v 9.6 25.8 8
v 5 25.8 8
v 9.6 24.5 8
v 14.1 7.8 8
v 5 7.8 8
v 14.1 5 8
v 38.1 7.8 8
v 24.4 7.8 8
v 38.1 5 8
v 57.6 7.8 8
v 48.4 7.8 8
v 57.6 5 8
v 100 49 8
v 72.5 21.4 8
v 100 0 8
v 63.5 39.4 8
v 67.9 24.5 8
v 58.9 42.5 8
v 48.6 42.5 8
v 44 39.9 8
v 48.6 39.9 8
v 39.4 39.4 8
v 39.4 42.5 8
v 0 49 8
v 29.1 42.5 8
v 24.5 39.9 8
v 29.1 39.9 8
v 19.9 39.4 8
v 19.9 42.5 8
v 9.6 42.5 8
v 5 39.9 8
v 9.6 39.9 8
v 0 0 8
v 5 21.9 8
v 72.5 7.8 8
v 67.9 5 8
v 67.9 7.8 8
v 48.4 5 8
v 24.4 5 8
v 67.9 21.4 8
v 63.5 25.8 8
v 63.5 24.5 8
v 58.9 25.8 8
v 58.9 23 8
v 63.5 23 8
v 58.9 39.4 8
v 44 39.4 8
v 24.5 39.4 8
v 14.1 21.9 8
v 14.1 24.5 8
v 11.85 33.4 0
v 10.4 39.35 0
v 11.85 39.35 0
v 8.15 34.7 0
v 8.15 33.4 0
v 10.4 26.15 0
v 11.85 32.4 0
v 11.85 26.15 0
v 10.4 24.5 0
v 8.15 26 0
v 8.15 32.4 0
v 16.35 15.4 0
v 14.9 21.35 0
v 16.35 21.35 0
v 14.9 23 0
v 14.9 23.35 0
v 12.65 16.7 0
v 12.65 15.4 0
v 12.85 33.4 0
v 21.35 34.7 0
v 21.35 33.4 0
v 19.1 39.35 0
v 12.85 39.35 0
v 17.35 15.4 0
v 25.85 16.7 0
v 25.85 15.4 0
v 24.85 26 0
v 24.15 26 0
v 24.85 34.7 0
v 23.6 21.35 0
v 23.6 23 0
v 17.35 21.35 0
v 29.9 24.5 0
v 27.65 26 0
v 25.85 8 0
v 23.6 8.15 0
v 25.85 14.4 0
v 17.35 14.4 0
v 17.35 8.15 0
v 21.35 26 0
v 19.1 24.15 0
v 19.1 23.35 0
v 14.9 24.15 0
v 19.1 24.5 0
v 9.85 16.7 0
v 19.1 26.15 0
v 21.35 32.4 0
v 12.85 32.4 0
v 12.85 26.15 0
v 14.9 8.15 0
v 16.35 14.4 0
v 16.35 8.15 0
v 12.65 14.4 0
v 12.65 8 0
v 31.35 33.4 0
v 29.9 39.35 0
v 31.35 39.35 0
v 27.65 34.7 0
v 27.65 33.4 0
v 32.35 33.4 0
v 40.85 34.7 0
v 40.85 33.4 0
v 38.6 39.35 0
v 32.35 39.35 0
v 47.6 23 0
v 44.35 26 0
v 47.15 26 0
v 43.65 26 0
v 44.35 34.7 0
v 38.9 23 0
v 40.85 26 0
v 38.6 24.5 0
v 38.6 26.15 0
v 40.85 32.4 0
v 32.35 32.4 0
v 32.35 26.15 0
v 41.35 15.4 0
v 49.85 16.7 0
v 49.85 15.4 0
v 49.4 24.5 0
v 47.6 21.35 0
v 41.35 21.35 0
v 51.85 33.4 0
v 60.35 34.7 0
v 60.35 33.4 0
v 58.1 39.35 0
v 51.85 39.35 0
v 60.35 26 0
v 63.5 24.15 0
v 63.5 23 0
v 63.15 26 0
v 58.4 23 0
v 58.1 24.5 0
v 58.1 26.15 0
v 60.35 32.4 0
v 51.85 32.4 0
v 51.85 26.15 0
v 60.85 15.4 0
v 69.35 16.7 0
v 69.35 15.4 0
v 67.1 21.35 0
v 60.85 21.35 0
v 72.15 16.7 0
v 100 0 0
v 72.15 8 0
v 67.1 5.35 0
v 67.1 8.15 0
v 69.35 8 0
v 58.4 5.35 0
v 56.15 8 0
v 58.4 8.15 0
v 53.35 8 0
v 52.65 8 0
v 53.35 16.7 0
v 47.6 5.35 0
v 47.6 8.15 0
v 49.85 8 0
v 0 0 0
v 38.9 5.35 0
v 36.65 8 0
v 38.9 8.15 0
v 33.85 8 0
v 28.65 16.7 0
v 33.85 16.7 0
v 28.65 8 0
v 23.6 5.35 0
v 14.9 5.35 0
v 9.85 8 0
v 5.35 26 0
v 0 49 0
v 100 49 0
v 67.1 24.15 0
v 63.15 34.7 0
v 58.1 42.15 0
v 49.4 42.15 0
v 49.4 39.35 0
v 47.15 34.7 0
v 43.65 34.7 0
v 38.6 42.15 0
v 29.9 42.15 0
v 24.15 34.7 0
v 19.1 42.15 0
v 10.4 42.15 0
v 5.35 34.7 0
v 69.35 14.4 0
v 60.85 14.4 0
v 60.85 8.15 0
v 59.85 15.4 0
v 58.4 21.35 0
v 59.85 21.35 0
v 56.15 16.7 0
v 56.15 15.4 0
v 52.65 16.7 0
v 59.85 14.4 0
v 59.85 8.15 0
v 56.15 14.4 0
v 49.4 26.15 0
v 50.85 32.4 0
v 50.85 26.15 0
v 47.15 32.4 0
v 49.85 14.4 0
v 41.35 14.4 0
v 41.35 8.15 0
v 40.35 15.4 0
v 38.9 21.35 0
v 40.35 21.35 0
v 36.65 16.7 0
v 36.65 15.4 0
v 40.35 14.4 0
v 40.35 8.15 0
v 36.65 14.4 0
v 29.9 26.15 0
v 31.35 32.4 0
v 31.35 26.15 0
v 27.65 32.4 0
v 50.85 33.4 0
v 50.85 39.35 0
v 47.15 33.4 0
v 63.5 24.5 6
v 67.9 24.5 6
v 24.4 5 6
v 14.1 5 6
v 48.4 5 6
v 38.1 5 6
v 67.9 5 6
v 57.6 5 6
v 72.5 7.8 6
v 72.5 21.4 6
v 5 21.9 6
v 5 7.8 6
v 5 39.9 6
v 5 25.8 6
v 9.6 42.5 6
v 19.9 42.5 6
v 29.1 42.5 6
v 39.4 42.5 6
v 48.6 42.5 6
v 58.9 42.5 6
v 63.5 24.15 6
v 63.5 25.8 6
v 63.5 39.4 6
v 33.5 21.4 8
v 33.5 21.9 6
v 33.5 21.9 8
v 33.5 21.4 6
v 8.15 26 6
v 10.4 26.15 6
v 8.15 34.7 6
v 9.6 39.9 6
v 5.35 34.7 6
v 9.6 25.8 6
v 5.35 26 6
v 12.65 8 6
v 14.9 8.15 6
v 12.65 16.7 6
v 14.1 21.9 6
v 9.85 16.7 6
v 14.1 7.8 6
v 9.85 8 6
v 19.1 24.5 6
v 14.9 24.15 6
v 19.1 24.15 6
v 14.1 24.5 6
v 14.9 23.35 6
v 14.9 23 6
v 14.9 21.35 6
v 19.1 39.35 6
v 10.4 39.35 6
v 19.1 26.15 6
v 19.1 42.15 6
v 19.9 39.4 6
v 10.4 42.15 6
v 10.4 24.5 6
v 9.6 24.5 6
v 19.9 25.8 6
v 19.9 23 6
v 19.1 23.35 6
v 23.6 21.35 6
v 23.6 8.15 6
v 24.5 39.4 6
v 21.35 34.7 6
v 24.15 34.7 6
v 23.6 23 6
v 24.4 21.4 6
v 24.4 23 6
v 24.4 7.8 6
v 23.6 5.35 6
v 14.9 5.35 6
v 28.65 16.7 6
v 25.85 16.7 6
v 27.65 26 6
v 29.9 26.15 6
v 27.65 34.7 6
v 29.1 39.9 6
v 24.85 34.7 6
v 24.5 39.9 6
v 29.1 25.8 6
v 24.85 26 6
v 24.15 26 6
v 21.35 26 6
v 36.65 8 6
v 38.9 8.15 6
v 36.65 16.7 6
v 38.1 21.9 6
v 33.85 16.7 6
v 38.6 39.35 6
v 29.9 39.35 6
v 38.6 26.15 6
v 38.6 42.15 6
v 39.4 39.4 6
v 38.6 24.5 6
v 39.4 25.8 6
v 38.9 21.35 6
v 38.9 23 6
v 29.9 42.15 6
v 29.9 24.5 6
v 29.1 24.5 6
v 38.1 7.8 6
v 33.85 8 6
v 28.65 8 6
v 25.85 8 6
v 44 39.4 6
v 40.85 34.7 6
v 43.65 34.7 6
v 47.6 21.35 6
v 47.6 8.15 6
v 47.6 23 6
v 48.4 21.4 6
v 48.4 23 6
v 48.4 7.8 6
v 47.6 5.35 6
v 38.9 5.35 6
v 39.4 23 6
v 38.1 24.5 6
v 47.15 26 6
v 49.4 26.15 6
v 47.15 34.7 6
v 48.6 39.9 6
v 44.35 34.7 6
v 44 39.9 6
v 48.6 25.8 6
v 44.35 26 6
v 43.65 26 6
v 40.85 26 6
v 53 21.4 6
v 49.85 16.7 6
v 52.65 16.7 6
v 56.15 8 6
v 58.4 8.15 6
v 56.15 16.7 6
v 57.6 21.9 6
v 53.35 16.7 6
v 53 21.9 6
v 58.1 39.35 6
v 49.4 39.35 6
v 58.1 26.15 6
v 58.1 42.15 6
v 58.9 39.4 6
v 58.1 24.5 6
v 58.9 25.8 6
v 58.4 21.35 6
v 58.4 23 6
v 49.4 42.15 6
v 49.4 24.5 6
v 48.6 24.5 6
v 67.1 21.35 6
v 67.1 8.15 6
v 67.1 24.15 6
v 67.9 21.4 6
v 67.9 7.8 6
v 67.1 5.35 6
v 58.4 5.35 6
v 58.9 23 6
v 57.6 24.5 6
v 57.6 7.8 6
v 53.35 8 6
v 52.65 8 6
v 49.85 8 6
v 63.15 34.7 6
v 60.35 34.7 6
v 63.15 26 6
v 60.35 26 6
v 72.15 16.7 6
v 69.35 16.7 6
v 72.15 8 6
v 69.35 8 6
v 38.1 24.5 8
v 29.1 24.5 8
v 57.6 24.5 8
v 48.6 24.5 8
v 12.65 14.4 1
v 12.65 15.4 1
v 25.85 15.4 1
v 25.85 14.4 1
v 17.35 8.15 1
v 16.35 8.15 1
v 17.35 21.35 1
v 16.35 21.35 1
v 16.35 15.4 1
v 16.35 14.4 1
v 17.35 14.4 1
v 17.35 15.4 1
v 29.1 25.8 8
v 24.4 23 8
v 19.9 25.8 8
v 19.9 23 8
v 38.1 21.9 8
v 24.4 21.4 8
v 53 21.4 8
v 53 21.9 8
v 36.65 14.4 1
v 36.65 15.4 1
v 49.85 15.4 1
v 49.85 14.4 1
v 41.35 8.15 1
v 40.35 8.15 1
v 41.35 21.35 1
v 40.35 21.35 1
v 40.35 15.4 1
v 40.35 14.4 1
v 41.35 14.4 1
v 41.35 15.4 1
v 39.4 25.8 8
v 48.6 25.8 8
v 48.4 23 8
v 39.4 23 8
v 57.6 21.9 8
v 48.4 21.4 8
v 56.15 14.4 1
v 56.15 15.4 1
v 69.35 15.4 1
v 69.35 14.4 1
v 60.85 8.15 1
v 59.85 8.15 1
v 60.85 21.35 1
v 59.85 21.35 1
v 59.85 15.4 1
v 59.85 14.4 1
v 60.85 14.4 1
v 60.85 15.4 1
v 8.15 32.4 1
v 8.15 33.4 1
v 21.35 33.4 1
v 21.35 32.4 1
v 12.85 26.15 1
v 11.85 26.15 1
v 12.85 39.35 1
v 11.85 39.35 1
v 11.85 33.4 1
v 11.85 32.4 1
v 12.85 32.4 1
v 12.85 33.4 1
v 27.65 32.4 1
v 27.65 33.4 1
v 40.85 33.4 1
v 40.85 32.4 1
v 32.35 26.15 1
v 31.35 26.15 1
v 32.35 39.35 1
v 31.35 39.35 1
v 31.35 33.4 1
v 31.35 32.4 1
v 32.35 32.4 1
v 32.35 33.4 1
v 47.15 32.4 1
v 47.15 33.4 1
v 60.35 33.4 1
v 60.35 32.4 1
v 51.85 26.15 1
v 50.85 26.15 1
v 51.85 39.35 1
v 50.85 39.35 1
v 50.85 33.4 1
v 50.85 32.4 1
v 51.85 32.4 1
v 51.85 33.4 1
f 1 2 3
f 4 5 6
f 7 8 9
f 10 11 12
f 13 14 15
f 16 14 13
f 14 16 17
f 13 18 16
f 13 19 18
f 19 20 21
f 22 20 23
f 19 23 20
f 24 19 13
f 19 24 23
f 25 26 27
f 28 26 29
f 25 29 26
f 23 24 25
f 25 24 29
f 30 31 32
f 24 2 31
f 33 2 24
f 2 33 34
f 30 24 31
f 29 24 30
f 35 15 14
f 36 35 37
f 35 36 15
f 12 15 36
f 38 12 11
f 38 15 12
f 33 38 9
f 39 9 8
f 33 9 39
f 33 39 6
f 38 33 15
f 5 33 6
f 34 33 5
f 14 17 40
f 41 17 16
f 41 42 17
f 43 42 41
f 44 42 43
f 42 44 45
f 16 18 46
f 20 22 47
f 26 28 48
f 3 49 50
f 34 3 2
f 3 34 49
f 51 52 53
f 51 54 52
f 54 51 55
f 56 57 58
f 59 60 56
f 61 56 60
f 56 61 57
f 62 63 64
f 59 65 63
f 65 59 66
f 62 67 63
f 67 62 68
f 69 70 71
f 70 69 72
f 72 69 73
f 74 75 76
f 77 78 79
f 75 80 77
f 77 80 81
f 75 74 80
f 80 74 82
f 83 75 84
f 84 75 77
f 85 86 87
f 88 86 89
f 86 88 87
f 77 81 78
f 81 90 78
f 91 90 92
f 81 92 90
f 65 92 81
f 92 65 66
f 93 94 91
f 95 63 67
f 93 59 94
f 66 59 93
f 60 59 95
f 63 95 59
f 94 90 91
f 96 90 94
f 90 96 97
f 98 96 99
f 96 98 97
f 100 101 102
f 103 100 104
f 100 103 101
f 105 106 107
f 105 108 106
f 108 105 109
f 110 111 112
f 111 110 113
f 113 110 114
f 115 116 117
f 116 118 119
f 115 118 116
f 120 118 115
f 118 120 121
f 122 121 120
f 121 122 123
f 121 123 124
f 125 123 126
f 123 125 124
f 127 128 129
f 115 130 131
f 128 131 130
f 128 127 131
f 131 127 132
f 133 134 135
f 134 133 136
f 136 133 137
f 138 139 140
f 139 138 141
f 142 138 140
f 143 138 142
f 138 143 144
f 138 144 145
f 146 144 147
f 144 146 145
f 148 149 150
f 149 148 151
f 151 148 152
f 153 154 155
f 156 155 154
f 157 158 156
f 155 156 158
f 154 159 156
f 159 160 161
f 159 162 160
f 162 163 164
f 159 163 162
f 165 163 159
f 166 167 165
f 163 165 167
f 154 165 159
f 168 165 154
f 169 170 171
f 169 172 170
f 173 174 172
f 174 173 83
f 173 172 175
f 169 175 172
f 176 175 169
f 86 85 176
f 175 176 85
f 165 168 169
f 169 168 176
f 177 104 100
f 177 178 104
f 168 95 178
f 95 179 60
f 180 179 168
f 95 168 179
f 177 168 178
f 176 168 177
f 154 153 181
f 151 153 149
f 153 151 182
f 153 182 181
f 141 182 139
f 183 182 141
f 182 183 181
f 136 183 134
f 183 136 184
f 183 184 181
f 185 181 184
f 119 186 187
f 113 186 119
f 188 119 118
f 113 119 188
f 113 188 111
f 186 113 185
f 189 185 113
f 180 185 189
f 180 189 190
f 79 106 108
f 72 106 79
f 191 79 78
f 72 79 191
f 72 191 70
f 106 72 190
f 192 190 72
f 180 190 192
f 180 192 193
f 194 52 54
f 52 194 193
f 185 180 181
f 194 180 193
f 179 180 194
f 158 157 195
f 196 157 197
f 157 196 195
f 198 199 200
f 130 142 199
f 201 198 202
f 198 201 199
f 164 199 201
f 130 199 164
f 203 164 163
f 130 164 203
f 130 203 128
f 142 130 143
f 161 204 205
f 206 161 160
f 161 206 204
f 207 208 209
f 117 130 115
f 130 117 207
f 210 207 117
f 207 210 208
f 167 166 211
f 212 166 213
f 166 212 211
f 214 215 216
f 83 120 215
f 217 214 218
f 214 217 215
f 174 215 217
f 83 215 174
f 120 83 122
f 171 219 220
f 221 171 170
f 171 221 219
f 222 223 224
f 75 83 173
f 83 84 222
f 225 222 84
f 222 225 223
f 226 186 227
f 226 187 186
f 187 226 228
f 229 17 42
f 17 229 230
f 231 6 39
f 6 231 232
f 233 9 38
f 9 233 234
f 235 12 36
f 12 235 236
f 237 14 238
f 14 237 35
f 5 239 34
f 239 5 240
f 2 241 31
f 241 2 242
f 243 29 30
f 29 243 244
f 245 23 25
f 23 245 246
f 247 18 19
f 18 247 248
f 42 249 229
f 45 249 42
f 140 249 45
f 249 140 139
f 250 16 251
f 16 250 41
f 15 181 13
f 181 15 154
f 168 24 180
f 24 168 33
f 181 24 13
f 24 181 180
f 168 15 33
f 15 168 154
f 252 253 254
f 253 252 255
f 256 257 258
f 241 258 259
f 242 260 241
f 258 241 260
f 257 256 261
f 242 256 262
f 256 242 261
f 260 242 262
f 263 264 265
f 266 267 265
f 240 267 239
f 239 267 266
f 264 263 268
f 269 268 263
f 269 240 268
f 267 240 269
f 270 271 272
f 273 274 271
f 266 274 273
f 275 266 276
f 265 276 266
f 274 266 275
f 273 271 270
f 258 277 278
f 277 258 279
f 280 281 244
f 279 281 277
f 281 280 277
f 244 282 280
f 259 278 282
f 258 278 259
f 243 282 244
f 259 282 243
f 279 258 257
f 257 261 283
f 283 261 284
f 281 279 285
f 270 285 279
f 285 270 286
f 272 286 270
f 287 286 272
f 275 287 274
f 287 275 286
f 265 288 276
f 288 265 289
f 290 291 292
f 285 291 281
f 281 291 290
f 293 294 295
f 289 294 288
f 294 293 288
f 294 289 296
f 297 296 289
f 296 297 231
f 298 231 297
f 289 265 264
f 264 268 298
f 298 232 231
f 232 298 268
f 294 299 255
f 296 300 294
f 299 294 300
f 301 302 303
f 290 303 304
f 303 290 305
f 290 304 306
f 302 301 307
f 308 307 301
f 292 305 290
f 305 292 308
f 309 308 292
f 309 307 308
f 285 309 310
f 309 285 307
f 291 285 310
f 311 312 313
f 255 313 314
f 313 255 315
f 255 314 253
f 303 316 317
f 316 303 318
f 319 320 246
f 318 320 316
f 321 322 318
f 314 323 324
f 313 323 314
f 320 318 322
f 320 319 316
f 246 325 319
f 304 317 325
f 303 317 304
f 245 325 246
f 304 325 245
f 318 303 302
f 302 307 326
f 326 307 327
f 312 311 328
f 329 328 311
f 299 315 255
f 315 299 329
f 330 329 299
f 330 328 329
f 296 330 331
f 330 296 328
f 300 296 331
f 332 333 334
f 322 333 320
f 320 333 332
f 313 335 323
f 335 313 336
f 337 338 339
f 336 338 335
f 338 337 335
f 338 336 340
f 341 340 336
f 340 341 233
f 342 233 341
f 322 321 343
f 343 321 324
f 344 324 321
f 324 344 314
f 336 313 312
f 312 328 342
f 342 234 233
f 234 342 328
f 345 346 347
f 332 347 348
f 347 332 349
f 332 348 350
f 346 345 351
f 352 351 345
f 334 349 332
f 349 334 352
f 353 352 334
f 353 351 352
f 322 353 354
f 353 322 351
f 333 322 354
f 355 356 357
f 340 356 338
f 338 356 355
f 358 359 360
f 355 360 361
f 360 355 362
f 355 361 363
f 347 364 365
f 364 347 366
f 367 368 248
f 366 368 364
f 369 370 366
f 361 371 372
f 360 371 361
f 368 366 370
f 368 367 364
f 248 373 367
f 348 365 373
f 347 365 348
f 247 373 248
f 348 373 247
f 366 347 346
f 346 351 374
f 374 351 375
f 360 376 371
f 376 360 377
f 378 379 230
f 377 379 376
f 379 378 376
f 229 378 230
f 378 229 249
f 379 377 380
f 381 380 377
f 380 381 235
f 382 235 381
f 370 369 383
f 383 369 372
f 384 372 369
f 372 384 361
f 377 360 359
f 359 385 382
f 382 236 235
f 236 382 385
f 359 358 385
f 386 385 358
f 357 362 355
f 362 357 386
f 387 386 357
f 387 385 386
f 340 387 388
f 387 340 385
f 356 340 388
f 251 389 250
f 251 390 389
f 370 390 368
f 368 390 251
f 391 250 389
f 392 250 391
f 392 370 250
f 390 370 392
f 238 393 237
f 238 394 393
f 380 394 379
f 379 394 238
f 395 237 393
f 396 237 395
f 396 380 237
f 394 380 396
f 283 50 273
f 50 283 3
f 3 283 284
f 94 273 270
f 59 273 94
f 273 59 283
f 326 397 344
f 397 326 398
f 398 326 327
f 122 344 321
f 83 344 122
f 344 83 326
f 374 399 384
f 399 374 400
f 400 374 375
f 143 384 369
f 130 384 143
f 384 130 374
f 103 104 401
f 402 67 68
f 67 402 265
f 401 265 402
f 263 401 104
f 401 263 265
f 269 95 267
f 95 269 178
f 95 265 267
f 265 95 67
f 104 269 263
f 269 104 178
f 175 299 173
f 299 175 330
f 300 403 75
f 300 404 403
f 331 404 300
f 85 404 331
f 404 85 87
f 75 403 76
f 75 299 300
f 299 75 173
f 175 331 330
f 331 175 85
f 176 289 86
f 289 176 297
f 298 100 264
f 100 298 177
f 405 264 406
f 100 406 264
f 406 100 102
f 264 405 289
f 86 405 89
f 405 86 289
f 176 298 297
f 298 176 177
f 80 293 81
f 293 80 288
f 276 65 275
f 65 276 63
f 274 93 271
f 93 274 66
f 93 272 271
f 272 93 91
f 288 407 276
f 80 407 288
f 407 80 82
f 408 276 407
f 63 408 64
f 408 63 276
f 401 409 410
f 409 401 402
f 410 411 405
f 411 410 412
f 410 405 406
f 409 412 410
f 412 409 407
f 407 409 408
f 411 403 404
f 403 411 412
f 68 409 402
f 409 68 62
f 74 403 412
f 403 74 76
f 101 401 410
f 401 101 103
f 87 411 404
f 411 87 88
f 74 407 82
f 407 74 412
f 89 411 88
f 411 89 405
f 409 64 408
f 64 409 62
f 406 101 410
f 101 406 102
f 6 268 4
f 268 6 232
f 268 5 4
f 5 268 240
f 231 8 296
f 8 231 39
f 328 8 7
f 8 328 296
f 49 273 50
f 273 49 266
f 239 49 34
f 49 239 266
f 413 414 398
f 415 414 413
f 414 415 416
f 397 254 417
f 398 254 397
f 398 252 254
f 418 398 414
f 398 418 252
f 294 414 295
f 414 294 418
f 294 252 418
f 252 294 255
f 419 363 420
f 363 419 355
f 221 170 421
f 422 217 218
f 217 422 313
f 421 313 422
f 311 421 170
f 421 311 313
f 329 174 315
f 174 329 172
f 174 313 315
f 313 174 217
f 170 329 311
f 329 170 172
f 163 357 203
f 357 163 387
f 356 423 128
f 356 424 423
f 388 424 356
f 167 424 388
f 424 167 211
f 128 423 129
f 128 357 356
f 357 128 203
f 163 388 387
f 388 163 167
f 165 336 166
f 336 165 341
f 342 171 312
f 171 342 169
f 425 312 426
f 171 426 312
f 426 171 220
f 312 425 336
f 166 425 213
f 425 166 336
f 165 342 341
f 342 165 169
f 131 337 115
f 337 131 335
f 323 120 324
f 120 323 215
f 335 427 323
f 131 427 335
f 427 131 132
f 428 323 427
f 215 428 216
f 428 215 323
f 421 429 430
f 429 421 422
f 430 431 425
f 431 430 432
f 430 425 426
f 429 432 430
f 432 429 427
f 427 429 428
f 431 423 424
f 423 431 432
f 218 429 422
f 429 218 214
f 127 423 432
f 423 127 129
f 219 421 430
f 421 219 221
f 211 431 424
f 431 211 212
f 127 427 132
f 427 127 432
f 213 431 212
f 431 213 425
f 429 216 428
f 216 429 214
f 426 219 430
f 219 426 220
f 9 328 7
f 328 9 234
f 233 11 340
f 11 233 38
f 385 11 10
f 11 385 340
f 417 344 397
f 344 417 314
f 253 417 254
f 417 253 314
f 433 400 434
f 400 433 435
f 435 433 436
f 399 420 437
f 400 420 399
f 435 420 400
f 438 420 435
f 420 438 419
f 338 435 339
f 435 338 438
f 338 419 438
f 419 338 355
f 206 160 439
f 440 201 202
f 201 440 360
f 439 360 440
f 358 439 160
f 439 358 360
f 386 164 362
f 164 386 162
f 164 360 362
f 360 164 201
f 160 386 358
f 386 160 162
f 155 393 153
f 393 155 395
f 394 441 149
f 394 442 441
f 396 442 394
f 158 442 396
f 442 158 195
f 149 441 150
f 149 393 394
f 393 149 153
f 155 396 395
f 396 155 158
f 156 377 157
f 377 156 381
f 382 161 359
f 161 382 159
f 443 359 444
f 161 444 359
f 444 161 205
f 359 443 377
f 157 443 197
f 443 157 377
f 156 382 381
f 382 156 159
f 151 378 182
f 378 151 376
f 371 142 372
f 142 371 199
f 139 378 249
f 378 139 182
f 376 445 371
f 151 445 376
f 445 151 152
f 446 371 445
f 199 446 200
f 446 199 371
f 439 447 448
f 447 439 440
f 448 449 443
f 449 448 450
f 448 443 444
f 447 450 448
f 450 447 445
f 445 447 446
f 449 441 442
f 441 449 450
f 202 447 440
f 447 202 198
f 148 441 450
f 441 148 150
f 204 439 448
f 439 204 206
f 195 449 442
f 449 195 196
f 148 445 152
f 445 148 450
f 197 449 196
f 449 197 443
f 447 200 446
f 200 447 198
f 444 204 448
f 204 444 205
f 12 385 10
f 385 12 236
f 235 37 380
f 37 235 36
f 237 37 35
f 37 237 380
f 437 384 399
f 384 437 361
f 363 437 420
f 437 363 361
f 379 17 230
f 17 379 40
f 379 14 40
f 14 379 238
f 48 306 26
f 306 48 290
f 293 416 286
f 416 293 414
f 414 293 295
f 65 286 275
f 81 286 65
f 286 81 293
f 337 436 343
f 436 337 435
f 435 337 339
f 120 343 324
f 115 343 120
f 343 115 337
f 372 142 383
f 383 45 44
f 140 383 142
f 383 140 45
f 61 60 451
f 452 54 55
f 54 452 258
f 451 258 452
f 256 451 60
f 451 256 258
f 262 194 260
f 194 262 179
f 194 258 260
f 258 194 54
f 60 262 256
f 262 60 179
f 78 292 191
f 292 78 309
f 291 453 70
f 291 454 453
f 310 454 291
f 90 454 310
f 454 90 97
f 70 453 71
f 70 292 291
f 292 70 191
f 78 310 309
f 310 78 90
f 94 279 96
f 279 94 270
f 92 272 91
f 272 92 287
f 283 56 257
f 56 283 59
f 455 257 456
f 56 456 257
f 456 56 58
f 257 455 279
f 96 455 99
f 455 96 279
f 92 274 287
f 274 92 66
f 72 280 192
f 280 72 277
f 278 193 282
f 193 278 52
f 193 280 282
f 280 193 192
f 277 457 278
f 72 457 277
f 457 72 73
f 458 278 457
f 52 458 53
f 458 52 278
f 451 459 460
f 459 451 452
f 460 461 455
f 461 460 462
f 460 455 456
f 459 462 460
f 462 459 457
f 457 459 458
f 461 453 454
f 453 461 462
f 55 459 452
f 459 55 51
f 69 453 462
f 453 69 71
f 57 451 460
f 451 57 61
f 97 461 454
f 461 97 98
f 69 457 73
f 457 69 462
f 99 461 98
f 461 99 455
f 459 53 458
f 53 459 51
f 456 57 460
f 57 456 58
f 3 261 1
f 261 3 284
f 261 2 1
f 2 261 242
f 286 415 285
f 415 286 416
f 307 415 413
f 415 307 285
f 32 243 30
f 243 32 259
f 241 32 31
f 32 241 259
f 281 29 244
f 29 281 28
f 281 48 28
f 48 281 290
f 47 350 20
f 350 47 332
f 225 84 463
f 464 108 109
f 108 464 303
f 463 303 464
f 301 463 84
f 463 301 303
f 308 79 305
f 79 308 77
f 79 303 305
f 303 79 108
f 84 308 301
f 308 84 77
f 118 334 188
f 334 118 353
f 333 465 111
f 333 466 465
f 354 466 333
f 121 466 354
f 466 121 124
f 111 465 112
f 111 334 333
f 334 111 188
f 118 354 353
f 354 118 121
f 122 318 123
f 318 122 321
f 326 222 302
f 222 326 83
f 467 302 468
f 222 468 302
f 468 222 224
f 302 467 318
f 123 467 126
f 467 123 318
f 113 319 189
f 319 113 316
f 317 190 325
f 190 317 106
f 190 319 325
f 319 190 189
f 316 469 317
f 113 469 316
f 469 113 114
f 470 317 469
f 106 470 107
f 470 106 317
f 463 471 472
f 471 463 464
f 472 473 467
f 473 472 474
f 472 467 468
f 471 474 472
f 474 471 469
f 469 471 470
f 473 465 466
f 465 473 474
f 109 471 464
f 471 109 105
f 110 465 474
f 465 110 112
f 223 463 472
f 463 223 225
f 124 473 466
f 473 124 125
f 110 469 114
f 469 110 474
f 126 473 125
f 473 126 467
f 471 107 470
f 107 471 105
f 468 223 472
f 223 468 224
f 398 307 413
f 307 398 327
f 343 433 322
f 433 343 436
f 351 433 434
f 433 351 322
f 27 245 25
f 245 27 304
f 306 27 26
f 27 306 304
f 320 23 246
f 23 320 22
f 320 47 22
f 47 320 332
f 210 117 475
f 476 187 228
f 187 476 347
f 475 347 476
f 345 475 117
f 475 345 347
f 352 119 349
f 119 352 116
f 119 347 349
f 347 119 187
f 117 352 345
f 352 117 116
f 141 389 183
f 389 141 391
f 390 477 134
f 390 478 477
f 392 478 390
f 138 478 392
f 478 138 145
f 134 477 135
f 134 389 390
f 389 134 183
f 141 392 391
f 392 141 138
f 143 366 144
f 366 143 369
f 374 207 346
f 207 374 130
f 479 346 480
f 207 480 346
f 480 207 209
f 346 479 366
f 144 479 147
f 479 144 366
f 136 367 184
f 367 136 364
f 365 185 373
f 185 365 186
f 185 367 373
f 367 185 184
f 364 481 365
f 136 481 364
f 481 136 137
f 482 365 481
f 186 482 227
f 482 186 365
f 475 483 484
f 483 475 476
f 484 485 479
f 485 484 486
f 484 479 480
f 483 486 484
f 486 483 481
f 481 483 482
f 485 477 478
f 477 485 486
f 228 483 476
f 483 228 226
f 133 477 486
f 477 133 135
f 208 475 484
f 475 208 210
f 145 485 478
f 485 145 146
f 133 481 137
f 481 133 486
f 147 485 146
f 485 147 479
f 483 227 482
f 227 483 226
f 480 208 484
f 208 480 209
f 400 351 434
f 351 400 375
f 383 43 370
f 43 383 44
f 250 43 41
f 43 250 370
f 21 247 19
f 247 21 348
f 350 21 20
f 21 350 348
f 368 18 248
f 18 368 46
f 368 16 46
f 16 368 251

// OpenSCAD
$fn = 30;

/*
 * Standard 1u keycap size
 *  Keycap placeholder space: 19.05 x 19.05mm
 *  Keycap size: 18 x 18mm
 *  Plate switch hole: 14 x 14mm
 *  Distance between switch holes: 5.05mm
 */

U1 = 18; /* Default */
U125 = U1 * 1.25; /* 22.5, Modifier */
U15 = U1 * 1.50;  /* 27.0, Modifier, Tab, '\|'' */
U175 = U1 * 1.75; /* 31.5, Caps Lock */
U2 = U1 * 2.00;   /* 36.0, Num Plus, Num Enter, Backspace */
U225 = U1 * 2.25; /* 40.5, Left Shift */
U275 = U1 * 2.75; /* 49.5, Right Shift */
U625 = U1 * 6.25; /* 112.5, Space */

/**
 * NeoKey PCB + PIN Header slot
 *
 *   |<-------------- 19.5 --------------->|
 *      |<---------- 18(1U) ----------->|
 *
 *  0.7 +-------------------------------+ 0.7 +--
 *      |       +---------------+       |     |
 *      |       |      8.7      |       |     |
 *      |       +---------------+       |     |
 *      |               ^               |     |
 *      |               |               |     |
 *      |  2.8          |               |     |
 *      | +---+         |         +---+ |     |
 *      | +   + <----  13.2 ----> +   + |     |
 *      | +   +         |         +   + |     |
 *      | +   +         |         +   + |     |
 *      | +---+         \/        +---+ |     |
 *      |       +---------------+       |     |
 *      |       |               |       |     |
 *      |       +---------------+       |     |
 *      +-------------------------------+     +--
 *
 *
 * Side view
 *
 *      +---+                       +---+
 *      | 2 |                       | 2 |
 *      +---+-----------------------+---+
 *      |              ^                |
 *      |              |                |
 *      |              6                |
 *      |              |                |
 *      |              \/               |
 *      +-------------------------------+
 *
 */

//----
NeoKeyMargin = 1.5; /* Minimum printable value with Prusa printers */
legDepth = 6;
SupportDepth = 2.0;

GuidelineCOL = 1;
GuidelineVIN = 0;
GuidelineROW = 1;
GuidelineGND = 0;

function getWidth(u_size = U1) = u_size + NeoKeyMargin;
function getHeight() = U1 + NeoKeyMargin;

module PCBSupportBox(u_size = U1) {
    w = u_size + NeoKeyMargin;
    h = U1 + NeoKeyMargin;

    cube([w, h, legDepth + SupportDepth]);
}

module PCBSupport(u_size = U1) {
    w = u_size + NeoKeyMargin;
    h = U1 + NeoKeyMargin;
    U1_w = U1 + NeoKeyMargin;

    diff = u_size - U1;
    sx = diff / 2;
    cx = w / 2;
    ex = w - diff / 2;

    sy = 0;
    cy = h / 2;
    ey = h;

    pinHeaderWidth = 2.8;
    pinHeaderHeight = 8.7;
    PinHeaderDistance = 13.2;

    difference() {
        cube([w, h, legDepth]);

        // Left PinHeader hole
        translate([cx - PinHeaderDistance / 2 - pinHeaderWidth, cy - pinHeaderHeight / 2 - 2.4, -1])
            cube([pinHeaderWidth, pinHeaderHeight, legDepth+2]);

        // Right PinHeader hole
        translate([cx + PinHeaderDistance / 2, cy - pinHeaderHeight / 2 - 2.4, -1])
            cube([pinHeaderWidth, pinHeaderHeight, legDepth+2]);

        // Bottom PinHeader hole
        translate([cx - pinHeaderHeight / 2, cy - PinHeaderDistance / 2 - pinHeaderWidth, -1])
            cube([pinHeaderHeight, pinHeaderWidth, legDepth+2]);

        // Top PinHeader hole
        translate([cx - pinHeaderHeight / 2, cy + PinHeaderDistance / 2, -1])
            cube([pinHeaderHeight, pinHeaderWidth, legDepth+2]);

        VGuidelineHeight = h - pinHeaderWidth * 2;
        VGuidelineWidth = 1;
        HGuidelineHeight = 1;
        HGuidelineWidth = U1_w - pinHeaderWidth * 2;

        // ROW Guideline
        if (GuidelineROW) {
            pin1 = 3.1 + pinHeaderHeight - pinHeaderHeight / 3 + HGuidelineHeight / 2;
            translate([w / 2 - HGuidelineWidth / 2, pin1, -1])
                cube([HGuidelineWidth, HGuidelineHeight, 2]);
        }

        // GND Guideline
        if (GuidelineGND) {
            pin1 = 3.1 + pinHeaderHeight / 3 - HGuidelineHeight;
            translate([w / 2 - HGuidelineWidth / 2, pin1, -1])
                cube([HGuidelineWidth, HGuidelineHeight, 2]);
        }

        // COL Guideline
        if (GuidelineCOL) {
            pin1 = w / 2 - pinHeaderHeight / 3;
            translate([pin1, h / 2 - VGuidelineHeight / 2, -1])
                cube([VGuidelineWidth, VGuidelineHeight, 2]);
        }

        // VIN Guideline
        if (GuidelineVIN) {
            pin3 = w / 2 + pinHeaderHeight / 3;
            translate([pin3, height / 2 - VGuidelineHeight / 2, -1])
                cube([VGuidelineWidth, VGuidelineHeight, 2]);
        }
    }


SupportHeight = 2.8;
SupportMargin = 0.4;
Distance = 0.8;

SupportWidth = w / 2 - pinHeaderHeight / 2 - Distance;

    // Left-Bottom Support
    translate([0, 0, legDepth])
        cube([SupportWidth, SupportHeight, SupportDepth]);

    // Right-Bottom Support
    translate([w - SupportWidth, 0, legDepth])
        cube([SupportWidth, SupportHeight, SupportDepth]);

    // Left-Top Support
    translate([0, h - (SupportHeight - 0.2), legDepth])
        cube([SupportWidth, SupportHeight - 0.2, SupportDepth]);

    // Right-Top Support
    translate([w - SupportWidth, h - (SupportHeight + 0.3), legDepth])
        cube([SupportWidth, SupportHeight + 0.3, SupportDepth]);

}


// ---------
panelDepth = 8;
panelMargin = 1;

module panel5() {
    w = getWidth();
    h = getHeight();

    panelMargin = 5;
    panelWidth = w * 3 + panelMargin * 2;
    panelHeight = h * 2 + panelMargin * 2;

    difference() {
        translate([0, 0, 0])
            cube([panelWidth, panelHeight, panelDepth]);

        translate([panelMargin, panelMargin, 0])
            PCBSupportBox();
        translate([panelMargin + w, panelMargin, 0])
            PCBSupportBox();
        translate([panelMargin, panelMargin + height, 0])
            PCBSupportBox();
        translate([panelMargin + w, panelMargin + height,0])
            PCBSupportBox();
        translate([panelMargin + w*2, panelMargin + height/2,0])
            PCBSupportBox();

        translate([3, 3, 0])
            cylinder(h = 5, r = 1.25);
        translate([3, panelHeight - 3, 0])
            cylinder(h = 5, r = 1.25);
        translate([panelWidth - 3, 3, 0])
            cylinder(h = 5, r = 1.25);
        translate([panelWidth - 3, panelHeight - 3, 0])
            cylinder(h = 5, r = 1.25);
    }

    translate([panelMargin, panelMargin, 0])
        PCBSupport();
    translate([panelMargin + w, panelMargin, 0])
        PCBSupport();
    translate([panelMargin, panelMargin + h, 0])
        PCBSupport();
    translate([panelMargin + w, panelMargin + h,0])
        PCBSupport();
    translate([panelMargin + w*2, panelMargin + h/2,0])
        PCBSupport();
}

module panel1(u_size = U1) {
    panelWidth = getWidth(u_size) + panelMargin * 2;
    panelHeight = getHeight() + panelMargin * 2;

    difference() {
        translate([0, 0, 0])
            cube([panelWidth, panelHeight, panelDepth]);

        translate([panelMargin, panelMargin, 0])
            PCBSupportBox(u_size);
    }

    translate([panelMargin, panelMargin, 0])
        PCBSupport(u_size);
}

module panel2(u_size = U1) {
    w = getWidth(u_size);
    h = getHeight();

echo ("w = ", w);

    panelMargin = 1;
    panelWidth = w * 2 + panelMargin * 2;
    panelHeight = h * 1 + panelMargin * 2;

    difference() {
        translate([0, 0, 0])
            cube([panelWidth, panelHeight, panelDepth]);

        translate([panelMargin, panelMargin, 0])
            PCBSupportBox(u_size);
        translate([panelMargin + w, panelMargin, 0])
            PCBSupportBox(u_size);
    }

    translate([panelMargin, panelMargin, 0])
        PCBSupport(u_size);
    translate([panelMargin + w, panelMargin, 0])
        PCBSupport(u_size);
}

module panel2_tab() {
    h = getHeight();

    panelWidth = getWidth(U15) + getWidth() + panelMargin * 2;
    panelHeight = h * 1;// + panelMargin * 2;

    difference() {
        translate([0, 0, 0])
            cube([panelWidth, panelHeight, panelDepth]);

        translate([panelMargin, panelMargin, 0])
            PCBSupportBox(U15);
        translate([panelMargin + getWidth(U15), panelMargin, 0])
            PCBSupportBox();
    }

    translate([panelMargin, panelMargin, 0])
        PCBSupport(U15);
    translate([panelMargin + getWidth(U15), panelMargin, 0])
        PCBSupport();
}

module panel2_ctrl() {
    h = getHeight();

    panelWidth = getWidth(U175) + getWidth() + panelMargin * 2;
    panelHeight = h * 1;// + panelMargin * 2;

    difference() {
        translate([0, 0, 0])
            cube([panelWidth, panelHeight, panelDepth]);

        translate([panelMargin, panelMargin, 0])
            PCBSupportBox(U175);
        translate([panelMargin + getWidth(U175), panelMargin, 0])
            PCBSupportBox();
    }

    translate([panelMargin, panelMargin, 0])
        PCBSupport(U175);
    translate([panelMargin + getWidth(U175), panelMargin, 0])
        PCBSupport();
}

module panel2_shift() {
    h = getHeight();

    panelWidth = getWidth(U225) + getWidth() + panelMargin * 2;
    panelHeight = h * 1;// + panelMargin * 2;

    difference() {
        translate([0, 0, 0])
            cube([panelWidth, panelHeight, panelDepth]);

        translate([panelMargin, panelMargin, 0])
            PCBSupportBox(U225);
        translate([panelMargin + getWidth(U225), panelMargin, 0])
            PCBSupportBox();
    }

    translate([panelMargin, panelMargin, 0])
        PCBSupport(U225);
    translate([panelMargin + getWidth(U225), panelMargin, 0])
        PCBSupport();
}

/*
translate([0, getHeight() * 2 + 2, 0])
    panel2_tab();

translate([0, getHeight(), 0])
    panel2_ctrl();

translate([0, 0, 0])
    panel2_shift();

translate([0, -30, 0])
    panel1();

translate([30, -30, 0])
    PCBSupport(U1);
*/

/*
KEYS = [
    [U1, U1, U1],
    [U15, U1, U1],
    [U175, U1, U1],
    [U225, U1, U1],
    [U125, U125, U125]
];
*/

KEYS = [
    [U1, U1, U1],
    [U15, U1, U1],
];

module _col(is_hole, x, y, i, list) {
    if (i < len(list)) {
        if (is_hole)
            translate([x, y, 0])
                PCBSupportBox(list[i]);
        else
            translate([x, y, 0])
                PCBSupport(list[i]);

        _col(is_hole, x + getWidth(list[i]), y, i+1, list);
    }
}

module _row(is_hole, y, i, list) {
    if (i >= 0) {
        _col(is_hole, 0, y, 0, list[i]);

        _row(is_hole, y + U1, i-1, list);
    }
}

module GenerateHole(list) {
    _row(1, 0, len(KEYS) - 1, KEYS);
}

module GenerateKey(list) {
    _row(0, 0, len(KEYS) - 1, KEYS);
}

module Keyboard(border, keymap) {
    height = border * 2 + len(keymap) * getHeight();

    translate([0,0,0])
        difference() {
            translate([0,0,0])
            cube([100, height, panelDepth]);

            translate([border, border, 0])
                GenerateHole(keymap);
    };

    translate([border, border, 0])
        GenerateKey(keymap);
}

Keyboard(5, KEYS);
